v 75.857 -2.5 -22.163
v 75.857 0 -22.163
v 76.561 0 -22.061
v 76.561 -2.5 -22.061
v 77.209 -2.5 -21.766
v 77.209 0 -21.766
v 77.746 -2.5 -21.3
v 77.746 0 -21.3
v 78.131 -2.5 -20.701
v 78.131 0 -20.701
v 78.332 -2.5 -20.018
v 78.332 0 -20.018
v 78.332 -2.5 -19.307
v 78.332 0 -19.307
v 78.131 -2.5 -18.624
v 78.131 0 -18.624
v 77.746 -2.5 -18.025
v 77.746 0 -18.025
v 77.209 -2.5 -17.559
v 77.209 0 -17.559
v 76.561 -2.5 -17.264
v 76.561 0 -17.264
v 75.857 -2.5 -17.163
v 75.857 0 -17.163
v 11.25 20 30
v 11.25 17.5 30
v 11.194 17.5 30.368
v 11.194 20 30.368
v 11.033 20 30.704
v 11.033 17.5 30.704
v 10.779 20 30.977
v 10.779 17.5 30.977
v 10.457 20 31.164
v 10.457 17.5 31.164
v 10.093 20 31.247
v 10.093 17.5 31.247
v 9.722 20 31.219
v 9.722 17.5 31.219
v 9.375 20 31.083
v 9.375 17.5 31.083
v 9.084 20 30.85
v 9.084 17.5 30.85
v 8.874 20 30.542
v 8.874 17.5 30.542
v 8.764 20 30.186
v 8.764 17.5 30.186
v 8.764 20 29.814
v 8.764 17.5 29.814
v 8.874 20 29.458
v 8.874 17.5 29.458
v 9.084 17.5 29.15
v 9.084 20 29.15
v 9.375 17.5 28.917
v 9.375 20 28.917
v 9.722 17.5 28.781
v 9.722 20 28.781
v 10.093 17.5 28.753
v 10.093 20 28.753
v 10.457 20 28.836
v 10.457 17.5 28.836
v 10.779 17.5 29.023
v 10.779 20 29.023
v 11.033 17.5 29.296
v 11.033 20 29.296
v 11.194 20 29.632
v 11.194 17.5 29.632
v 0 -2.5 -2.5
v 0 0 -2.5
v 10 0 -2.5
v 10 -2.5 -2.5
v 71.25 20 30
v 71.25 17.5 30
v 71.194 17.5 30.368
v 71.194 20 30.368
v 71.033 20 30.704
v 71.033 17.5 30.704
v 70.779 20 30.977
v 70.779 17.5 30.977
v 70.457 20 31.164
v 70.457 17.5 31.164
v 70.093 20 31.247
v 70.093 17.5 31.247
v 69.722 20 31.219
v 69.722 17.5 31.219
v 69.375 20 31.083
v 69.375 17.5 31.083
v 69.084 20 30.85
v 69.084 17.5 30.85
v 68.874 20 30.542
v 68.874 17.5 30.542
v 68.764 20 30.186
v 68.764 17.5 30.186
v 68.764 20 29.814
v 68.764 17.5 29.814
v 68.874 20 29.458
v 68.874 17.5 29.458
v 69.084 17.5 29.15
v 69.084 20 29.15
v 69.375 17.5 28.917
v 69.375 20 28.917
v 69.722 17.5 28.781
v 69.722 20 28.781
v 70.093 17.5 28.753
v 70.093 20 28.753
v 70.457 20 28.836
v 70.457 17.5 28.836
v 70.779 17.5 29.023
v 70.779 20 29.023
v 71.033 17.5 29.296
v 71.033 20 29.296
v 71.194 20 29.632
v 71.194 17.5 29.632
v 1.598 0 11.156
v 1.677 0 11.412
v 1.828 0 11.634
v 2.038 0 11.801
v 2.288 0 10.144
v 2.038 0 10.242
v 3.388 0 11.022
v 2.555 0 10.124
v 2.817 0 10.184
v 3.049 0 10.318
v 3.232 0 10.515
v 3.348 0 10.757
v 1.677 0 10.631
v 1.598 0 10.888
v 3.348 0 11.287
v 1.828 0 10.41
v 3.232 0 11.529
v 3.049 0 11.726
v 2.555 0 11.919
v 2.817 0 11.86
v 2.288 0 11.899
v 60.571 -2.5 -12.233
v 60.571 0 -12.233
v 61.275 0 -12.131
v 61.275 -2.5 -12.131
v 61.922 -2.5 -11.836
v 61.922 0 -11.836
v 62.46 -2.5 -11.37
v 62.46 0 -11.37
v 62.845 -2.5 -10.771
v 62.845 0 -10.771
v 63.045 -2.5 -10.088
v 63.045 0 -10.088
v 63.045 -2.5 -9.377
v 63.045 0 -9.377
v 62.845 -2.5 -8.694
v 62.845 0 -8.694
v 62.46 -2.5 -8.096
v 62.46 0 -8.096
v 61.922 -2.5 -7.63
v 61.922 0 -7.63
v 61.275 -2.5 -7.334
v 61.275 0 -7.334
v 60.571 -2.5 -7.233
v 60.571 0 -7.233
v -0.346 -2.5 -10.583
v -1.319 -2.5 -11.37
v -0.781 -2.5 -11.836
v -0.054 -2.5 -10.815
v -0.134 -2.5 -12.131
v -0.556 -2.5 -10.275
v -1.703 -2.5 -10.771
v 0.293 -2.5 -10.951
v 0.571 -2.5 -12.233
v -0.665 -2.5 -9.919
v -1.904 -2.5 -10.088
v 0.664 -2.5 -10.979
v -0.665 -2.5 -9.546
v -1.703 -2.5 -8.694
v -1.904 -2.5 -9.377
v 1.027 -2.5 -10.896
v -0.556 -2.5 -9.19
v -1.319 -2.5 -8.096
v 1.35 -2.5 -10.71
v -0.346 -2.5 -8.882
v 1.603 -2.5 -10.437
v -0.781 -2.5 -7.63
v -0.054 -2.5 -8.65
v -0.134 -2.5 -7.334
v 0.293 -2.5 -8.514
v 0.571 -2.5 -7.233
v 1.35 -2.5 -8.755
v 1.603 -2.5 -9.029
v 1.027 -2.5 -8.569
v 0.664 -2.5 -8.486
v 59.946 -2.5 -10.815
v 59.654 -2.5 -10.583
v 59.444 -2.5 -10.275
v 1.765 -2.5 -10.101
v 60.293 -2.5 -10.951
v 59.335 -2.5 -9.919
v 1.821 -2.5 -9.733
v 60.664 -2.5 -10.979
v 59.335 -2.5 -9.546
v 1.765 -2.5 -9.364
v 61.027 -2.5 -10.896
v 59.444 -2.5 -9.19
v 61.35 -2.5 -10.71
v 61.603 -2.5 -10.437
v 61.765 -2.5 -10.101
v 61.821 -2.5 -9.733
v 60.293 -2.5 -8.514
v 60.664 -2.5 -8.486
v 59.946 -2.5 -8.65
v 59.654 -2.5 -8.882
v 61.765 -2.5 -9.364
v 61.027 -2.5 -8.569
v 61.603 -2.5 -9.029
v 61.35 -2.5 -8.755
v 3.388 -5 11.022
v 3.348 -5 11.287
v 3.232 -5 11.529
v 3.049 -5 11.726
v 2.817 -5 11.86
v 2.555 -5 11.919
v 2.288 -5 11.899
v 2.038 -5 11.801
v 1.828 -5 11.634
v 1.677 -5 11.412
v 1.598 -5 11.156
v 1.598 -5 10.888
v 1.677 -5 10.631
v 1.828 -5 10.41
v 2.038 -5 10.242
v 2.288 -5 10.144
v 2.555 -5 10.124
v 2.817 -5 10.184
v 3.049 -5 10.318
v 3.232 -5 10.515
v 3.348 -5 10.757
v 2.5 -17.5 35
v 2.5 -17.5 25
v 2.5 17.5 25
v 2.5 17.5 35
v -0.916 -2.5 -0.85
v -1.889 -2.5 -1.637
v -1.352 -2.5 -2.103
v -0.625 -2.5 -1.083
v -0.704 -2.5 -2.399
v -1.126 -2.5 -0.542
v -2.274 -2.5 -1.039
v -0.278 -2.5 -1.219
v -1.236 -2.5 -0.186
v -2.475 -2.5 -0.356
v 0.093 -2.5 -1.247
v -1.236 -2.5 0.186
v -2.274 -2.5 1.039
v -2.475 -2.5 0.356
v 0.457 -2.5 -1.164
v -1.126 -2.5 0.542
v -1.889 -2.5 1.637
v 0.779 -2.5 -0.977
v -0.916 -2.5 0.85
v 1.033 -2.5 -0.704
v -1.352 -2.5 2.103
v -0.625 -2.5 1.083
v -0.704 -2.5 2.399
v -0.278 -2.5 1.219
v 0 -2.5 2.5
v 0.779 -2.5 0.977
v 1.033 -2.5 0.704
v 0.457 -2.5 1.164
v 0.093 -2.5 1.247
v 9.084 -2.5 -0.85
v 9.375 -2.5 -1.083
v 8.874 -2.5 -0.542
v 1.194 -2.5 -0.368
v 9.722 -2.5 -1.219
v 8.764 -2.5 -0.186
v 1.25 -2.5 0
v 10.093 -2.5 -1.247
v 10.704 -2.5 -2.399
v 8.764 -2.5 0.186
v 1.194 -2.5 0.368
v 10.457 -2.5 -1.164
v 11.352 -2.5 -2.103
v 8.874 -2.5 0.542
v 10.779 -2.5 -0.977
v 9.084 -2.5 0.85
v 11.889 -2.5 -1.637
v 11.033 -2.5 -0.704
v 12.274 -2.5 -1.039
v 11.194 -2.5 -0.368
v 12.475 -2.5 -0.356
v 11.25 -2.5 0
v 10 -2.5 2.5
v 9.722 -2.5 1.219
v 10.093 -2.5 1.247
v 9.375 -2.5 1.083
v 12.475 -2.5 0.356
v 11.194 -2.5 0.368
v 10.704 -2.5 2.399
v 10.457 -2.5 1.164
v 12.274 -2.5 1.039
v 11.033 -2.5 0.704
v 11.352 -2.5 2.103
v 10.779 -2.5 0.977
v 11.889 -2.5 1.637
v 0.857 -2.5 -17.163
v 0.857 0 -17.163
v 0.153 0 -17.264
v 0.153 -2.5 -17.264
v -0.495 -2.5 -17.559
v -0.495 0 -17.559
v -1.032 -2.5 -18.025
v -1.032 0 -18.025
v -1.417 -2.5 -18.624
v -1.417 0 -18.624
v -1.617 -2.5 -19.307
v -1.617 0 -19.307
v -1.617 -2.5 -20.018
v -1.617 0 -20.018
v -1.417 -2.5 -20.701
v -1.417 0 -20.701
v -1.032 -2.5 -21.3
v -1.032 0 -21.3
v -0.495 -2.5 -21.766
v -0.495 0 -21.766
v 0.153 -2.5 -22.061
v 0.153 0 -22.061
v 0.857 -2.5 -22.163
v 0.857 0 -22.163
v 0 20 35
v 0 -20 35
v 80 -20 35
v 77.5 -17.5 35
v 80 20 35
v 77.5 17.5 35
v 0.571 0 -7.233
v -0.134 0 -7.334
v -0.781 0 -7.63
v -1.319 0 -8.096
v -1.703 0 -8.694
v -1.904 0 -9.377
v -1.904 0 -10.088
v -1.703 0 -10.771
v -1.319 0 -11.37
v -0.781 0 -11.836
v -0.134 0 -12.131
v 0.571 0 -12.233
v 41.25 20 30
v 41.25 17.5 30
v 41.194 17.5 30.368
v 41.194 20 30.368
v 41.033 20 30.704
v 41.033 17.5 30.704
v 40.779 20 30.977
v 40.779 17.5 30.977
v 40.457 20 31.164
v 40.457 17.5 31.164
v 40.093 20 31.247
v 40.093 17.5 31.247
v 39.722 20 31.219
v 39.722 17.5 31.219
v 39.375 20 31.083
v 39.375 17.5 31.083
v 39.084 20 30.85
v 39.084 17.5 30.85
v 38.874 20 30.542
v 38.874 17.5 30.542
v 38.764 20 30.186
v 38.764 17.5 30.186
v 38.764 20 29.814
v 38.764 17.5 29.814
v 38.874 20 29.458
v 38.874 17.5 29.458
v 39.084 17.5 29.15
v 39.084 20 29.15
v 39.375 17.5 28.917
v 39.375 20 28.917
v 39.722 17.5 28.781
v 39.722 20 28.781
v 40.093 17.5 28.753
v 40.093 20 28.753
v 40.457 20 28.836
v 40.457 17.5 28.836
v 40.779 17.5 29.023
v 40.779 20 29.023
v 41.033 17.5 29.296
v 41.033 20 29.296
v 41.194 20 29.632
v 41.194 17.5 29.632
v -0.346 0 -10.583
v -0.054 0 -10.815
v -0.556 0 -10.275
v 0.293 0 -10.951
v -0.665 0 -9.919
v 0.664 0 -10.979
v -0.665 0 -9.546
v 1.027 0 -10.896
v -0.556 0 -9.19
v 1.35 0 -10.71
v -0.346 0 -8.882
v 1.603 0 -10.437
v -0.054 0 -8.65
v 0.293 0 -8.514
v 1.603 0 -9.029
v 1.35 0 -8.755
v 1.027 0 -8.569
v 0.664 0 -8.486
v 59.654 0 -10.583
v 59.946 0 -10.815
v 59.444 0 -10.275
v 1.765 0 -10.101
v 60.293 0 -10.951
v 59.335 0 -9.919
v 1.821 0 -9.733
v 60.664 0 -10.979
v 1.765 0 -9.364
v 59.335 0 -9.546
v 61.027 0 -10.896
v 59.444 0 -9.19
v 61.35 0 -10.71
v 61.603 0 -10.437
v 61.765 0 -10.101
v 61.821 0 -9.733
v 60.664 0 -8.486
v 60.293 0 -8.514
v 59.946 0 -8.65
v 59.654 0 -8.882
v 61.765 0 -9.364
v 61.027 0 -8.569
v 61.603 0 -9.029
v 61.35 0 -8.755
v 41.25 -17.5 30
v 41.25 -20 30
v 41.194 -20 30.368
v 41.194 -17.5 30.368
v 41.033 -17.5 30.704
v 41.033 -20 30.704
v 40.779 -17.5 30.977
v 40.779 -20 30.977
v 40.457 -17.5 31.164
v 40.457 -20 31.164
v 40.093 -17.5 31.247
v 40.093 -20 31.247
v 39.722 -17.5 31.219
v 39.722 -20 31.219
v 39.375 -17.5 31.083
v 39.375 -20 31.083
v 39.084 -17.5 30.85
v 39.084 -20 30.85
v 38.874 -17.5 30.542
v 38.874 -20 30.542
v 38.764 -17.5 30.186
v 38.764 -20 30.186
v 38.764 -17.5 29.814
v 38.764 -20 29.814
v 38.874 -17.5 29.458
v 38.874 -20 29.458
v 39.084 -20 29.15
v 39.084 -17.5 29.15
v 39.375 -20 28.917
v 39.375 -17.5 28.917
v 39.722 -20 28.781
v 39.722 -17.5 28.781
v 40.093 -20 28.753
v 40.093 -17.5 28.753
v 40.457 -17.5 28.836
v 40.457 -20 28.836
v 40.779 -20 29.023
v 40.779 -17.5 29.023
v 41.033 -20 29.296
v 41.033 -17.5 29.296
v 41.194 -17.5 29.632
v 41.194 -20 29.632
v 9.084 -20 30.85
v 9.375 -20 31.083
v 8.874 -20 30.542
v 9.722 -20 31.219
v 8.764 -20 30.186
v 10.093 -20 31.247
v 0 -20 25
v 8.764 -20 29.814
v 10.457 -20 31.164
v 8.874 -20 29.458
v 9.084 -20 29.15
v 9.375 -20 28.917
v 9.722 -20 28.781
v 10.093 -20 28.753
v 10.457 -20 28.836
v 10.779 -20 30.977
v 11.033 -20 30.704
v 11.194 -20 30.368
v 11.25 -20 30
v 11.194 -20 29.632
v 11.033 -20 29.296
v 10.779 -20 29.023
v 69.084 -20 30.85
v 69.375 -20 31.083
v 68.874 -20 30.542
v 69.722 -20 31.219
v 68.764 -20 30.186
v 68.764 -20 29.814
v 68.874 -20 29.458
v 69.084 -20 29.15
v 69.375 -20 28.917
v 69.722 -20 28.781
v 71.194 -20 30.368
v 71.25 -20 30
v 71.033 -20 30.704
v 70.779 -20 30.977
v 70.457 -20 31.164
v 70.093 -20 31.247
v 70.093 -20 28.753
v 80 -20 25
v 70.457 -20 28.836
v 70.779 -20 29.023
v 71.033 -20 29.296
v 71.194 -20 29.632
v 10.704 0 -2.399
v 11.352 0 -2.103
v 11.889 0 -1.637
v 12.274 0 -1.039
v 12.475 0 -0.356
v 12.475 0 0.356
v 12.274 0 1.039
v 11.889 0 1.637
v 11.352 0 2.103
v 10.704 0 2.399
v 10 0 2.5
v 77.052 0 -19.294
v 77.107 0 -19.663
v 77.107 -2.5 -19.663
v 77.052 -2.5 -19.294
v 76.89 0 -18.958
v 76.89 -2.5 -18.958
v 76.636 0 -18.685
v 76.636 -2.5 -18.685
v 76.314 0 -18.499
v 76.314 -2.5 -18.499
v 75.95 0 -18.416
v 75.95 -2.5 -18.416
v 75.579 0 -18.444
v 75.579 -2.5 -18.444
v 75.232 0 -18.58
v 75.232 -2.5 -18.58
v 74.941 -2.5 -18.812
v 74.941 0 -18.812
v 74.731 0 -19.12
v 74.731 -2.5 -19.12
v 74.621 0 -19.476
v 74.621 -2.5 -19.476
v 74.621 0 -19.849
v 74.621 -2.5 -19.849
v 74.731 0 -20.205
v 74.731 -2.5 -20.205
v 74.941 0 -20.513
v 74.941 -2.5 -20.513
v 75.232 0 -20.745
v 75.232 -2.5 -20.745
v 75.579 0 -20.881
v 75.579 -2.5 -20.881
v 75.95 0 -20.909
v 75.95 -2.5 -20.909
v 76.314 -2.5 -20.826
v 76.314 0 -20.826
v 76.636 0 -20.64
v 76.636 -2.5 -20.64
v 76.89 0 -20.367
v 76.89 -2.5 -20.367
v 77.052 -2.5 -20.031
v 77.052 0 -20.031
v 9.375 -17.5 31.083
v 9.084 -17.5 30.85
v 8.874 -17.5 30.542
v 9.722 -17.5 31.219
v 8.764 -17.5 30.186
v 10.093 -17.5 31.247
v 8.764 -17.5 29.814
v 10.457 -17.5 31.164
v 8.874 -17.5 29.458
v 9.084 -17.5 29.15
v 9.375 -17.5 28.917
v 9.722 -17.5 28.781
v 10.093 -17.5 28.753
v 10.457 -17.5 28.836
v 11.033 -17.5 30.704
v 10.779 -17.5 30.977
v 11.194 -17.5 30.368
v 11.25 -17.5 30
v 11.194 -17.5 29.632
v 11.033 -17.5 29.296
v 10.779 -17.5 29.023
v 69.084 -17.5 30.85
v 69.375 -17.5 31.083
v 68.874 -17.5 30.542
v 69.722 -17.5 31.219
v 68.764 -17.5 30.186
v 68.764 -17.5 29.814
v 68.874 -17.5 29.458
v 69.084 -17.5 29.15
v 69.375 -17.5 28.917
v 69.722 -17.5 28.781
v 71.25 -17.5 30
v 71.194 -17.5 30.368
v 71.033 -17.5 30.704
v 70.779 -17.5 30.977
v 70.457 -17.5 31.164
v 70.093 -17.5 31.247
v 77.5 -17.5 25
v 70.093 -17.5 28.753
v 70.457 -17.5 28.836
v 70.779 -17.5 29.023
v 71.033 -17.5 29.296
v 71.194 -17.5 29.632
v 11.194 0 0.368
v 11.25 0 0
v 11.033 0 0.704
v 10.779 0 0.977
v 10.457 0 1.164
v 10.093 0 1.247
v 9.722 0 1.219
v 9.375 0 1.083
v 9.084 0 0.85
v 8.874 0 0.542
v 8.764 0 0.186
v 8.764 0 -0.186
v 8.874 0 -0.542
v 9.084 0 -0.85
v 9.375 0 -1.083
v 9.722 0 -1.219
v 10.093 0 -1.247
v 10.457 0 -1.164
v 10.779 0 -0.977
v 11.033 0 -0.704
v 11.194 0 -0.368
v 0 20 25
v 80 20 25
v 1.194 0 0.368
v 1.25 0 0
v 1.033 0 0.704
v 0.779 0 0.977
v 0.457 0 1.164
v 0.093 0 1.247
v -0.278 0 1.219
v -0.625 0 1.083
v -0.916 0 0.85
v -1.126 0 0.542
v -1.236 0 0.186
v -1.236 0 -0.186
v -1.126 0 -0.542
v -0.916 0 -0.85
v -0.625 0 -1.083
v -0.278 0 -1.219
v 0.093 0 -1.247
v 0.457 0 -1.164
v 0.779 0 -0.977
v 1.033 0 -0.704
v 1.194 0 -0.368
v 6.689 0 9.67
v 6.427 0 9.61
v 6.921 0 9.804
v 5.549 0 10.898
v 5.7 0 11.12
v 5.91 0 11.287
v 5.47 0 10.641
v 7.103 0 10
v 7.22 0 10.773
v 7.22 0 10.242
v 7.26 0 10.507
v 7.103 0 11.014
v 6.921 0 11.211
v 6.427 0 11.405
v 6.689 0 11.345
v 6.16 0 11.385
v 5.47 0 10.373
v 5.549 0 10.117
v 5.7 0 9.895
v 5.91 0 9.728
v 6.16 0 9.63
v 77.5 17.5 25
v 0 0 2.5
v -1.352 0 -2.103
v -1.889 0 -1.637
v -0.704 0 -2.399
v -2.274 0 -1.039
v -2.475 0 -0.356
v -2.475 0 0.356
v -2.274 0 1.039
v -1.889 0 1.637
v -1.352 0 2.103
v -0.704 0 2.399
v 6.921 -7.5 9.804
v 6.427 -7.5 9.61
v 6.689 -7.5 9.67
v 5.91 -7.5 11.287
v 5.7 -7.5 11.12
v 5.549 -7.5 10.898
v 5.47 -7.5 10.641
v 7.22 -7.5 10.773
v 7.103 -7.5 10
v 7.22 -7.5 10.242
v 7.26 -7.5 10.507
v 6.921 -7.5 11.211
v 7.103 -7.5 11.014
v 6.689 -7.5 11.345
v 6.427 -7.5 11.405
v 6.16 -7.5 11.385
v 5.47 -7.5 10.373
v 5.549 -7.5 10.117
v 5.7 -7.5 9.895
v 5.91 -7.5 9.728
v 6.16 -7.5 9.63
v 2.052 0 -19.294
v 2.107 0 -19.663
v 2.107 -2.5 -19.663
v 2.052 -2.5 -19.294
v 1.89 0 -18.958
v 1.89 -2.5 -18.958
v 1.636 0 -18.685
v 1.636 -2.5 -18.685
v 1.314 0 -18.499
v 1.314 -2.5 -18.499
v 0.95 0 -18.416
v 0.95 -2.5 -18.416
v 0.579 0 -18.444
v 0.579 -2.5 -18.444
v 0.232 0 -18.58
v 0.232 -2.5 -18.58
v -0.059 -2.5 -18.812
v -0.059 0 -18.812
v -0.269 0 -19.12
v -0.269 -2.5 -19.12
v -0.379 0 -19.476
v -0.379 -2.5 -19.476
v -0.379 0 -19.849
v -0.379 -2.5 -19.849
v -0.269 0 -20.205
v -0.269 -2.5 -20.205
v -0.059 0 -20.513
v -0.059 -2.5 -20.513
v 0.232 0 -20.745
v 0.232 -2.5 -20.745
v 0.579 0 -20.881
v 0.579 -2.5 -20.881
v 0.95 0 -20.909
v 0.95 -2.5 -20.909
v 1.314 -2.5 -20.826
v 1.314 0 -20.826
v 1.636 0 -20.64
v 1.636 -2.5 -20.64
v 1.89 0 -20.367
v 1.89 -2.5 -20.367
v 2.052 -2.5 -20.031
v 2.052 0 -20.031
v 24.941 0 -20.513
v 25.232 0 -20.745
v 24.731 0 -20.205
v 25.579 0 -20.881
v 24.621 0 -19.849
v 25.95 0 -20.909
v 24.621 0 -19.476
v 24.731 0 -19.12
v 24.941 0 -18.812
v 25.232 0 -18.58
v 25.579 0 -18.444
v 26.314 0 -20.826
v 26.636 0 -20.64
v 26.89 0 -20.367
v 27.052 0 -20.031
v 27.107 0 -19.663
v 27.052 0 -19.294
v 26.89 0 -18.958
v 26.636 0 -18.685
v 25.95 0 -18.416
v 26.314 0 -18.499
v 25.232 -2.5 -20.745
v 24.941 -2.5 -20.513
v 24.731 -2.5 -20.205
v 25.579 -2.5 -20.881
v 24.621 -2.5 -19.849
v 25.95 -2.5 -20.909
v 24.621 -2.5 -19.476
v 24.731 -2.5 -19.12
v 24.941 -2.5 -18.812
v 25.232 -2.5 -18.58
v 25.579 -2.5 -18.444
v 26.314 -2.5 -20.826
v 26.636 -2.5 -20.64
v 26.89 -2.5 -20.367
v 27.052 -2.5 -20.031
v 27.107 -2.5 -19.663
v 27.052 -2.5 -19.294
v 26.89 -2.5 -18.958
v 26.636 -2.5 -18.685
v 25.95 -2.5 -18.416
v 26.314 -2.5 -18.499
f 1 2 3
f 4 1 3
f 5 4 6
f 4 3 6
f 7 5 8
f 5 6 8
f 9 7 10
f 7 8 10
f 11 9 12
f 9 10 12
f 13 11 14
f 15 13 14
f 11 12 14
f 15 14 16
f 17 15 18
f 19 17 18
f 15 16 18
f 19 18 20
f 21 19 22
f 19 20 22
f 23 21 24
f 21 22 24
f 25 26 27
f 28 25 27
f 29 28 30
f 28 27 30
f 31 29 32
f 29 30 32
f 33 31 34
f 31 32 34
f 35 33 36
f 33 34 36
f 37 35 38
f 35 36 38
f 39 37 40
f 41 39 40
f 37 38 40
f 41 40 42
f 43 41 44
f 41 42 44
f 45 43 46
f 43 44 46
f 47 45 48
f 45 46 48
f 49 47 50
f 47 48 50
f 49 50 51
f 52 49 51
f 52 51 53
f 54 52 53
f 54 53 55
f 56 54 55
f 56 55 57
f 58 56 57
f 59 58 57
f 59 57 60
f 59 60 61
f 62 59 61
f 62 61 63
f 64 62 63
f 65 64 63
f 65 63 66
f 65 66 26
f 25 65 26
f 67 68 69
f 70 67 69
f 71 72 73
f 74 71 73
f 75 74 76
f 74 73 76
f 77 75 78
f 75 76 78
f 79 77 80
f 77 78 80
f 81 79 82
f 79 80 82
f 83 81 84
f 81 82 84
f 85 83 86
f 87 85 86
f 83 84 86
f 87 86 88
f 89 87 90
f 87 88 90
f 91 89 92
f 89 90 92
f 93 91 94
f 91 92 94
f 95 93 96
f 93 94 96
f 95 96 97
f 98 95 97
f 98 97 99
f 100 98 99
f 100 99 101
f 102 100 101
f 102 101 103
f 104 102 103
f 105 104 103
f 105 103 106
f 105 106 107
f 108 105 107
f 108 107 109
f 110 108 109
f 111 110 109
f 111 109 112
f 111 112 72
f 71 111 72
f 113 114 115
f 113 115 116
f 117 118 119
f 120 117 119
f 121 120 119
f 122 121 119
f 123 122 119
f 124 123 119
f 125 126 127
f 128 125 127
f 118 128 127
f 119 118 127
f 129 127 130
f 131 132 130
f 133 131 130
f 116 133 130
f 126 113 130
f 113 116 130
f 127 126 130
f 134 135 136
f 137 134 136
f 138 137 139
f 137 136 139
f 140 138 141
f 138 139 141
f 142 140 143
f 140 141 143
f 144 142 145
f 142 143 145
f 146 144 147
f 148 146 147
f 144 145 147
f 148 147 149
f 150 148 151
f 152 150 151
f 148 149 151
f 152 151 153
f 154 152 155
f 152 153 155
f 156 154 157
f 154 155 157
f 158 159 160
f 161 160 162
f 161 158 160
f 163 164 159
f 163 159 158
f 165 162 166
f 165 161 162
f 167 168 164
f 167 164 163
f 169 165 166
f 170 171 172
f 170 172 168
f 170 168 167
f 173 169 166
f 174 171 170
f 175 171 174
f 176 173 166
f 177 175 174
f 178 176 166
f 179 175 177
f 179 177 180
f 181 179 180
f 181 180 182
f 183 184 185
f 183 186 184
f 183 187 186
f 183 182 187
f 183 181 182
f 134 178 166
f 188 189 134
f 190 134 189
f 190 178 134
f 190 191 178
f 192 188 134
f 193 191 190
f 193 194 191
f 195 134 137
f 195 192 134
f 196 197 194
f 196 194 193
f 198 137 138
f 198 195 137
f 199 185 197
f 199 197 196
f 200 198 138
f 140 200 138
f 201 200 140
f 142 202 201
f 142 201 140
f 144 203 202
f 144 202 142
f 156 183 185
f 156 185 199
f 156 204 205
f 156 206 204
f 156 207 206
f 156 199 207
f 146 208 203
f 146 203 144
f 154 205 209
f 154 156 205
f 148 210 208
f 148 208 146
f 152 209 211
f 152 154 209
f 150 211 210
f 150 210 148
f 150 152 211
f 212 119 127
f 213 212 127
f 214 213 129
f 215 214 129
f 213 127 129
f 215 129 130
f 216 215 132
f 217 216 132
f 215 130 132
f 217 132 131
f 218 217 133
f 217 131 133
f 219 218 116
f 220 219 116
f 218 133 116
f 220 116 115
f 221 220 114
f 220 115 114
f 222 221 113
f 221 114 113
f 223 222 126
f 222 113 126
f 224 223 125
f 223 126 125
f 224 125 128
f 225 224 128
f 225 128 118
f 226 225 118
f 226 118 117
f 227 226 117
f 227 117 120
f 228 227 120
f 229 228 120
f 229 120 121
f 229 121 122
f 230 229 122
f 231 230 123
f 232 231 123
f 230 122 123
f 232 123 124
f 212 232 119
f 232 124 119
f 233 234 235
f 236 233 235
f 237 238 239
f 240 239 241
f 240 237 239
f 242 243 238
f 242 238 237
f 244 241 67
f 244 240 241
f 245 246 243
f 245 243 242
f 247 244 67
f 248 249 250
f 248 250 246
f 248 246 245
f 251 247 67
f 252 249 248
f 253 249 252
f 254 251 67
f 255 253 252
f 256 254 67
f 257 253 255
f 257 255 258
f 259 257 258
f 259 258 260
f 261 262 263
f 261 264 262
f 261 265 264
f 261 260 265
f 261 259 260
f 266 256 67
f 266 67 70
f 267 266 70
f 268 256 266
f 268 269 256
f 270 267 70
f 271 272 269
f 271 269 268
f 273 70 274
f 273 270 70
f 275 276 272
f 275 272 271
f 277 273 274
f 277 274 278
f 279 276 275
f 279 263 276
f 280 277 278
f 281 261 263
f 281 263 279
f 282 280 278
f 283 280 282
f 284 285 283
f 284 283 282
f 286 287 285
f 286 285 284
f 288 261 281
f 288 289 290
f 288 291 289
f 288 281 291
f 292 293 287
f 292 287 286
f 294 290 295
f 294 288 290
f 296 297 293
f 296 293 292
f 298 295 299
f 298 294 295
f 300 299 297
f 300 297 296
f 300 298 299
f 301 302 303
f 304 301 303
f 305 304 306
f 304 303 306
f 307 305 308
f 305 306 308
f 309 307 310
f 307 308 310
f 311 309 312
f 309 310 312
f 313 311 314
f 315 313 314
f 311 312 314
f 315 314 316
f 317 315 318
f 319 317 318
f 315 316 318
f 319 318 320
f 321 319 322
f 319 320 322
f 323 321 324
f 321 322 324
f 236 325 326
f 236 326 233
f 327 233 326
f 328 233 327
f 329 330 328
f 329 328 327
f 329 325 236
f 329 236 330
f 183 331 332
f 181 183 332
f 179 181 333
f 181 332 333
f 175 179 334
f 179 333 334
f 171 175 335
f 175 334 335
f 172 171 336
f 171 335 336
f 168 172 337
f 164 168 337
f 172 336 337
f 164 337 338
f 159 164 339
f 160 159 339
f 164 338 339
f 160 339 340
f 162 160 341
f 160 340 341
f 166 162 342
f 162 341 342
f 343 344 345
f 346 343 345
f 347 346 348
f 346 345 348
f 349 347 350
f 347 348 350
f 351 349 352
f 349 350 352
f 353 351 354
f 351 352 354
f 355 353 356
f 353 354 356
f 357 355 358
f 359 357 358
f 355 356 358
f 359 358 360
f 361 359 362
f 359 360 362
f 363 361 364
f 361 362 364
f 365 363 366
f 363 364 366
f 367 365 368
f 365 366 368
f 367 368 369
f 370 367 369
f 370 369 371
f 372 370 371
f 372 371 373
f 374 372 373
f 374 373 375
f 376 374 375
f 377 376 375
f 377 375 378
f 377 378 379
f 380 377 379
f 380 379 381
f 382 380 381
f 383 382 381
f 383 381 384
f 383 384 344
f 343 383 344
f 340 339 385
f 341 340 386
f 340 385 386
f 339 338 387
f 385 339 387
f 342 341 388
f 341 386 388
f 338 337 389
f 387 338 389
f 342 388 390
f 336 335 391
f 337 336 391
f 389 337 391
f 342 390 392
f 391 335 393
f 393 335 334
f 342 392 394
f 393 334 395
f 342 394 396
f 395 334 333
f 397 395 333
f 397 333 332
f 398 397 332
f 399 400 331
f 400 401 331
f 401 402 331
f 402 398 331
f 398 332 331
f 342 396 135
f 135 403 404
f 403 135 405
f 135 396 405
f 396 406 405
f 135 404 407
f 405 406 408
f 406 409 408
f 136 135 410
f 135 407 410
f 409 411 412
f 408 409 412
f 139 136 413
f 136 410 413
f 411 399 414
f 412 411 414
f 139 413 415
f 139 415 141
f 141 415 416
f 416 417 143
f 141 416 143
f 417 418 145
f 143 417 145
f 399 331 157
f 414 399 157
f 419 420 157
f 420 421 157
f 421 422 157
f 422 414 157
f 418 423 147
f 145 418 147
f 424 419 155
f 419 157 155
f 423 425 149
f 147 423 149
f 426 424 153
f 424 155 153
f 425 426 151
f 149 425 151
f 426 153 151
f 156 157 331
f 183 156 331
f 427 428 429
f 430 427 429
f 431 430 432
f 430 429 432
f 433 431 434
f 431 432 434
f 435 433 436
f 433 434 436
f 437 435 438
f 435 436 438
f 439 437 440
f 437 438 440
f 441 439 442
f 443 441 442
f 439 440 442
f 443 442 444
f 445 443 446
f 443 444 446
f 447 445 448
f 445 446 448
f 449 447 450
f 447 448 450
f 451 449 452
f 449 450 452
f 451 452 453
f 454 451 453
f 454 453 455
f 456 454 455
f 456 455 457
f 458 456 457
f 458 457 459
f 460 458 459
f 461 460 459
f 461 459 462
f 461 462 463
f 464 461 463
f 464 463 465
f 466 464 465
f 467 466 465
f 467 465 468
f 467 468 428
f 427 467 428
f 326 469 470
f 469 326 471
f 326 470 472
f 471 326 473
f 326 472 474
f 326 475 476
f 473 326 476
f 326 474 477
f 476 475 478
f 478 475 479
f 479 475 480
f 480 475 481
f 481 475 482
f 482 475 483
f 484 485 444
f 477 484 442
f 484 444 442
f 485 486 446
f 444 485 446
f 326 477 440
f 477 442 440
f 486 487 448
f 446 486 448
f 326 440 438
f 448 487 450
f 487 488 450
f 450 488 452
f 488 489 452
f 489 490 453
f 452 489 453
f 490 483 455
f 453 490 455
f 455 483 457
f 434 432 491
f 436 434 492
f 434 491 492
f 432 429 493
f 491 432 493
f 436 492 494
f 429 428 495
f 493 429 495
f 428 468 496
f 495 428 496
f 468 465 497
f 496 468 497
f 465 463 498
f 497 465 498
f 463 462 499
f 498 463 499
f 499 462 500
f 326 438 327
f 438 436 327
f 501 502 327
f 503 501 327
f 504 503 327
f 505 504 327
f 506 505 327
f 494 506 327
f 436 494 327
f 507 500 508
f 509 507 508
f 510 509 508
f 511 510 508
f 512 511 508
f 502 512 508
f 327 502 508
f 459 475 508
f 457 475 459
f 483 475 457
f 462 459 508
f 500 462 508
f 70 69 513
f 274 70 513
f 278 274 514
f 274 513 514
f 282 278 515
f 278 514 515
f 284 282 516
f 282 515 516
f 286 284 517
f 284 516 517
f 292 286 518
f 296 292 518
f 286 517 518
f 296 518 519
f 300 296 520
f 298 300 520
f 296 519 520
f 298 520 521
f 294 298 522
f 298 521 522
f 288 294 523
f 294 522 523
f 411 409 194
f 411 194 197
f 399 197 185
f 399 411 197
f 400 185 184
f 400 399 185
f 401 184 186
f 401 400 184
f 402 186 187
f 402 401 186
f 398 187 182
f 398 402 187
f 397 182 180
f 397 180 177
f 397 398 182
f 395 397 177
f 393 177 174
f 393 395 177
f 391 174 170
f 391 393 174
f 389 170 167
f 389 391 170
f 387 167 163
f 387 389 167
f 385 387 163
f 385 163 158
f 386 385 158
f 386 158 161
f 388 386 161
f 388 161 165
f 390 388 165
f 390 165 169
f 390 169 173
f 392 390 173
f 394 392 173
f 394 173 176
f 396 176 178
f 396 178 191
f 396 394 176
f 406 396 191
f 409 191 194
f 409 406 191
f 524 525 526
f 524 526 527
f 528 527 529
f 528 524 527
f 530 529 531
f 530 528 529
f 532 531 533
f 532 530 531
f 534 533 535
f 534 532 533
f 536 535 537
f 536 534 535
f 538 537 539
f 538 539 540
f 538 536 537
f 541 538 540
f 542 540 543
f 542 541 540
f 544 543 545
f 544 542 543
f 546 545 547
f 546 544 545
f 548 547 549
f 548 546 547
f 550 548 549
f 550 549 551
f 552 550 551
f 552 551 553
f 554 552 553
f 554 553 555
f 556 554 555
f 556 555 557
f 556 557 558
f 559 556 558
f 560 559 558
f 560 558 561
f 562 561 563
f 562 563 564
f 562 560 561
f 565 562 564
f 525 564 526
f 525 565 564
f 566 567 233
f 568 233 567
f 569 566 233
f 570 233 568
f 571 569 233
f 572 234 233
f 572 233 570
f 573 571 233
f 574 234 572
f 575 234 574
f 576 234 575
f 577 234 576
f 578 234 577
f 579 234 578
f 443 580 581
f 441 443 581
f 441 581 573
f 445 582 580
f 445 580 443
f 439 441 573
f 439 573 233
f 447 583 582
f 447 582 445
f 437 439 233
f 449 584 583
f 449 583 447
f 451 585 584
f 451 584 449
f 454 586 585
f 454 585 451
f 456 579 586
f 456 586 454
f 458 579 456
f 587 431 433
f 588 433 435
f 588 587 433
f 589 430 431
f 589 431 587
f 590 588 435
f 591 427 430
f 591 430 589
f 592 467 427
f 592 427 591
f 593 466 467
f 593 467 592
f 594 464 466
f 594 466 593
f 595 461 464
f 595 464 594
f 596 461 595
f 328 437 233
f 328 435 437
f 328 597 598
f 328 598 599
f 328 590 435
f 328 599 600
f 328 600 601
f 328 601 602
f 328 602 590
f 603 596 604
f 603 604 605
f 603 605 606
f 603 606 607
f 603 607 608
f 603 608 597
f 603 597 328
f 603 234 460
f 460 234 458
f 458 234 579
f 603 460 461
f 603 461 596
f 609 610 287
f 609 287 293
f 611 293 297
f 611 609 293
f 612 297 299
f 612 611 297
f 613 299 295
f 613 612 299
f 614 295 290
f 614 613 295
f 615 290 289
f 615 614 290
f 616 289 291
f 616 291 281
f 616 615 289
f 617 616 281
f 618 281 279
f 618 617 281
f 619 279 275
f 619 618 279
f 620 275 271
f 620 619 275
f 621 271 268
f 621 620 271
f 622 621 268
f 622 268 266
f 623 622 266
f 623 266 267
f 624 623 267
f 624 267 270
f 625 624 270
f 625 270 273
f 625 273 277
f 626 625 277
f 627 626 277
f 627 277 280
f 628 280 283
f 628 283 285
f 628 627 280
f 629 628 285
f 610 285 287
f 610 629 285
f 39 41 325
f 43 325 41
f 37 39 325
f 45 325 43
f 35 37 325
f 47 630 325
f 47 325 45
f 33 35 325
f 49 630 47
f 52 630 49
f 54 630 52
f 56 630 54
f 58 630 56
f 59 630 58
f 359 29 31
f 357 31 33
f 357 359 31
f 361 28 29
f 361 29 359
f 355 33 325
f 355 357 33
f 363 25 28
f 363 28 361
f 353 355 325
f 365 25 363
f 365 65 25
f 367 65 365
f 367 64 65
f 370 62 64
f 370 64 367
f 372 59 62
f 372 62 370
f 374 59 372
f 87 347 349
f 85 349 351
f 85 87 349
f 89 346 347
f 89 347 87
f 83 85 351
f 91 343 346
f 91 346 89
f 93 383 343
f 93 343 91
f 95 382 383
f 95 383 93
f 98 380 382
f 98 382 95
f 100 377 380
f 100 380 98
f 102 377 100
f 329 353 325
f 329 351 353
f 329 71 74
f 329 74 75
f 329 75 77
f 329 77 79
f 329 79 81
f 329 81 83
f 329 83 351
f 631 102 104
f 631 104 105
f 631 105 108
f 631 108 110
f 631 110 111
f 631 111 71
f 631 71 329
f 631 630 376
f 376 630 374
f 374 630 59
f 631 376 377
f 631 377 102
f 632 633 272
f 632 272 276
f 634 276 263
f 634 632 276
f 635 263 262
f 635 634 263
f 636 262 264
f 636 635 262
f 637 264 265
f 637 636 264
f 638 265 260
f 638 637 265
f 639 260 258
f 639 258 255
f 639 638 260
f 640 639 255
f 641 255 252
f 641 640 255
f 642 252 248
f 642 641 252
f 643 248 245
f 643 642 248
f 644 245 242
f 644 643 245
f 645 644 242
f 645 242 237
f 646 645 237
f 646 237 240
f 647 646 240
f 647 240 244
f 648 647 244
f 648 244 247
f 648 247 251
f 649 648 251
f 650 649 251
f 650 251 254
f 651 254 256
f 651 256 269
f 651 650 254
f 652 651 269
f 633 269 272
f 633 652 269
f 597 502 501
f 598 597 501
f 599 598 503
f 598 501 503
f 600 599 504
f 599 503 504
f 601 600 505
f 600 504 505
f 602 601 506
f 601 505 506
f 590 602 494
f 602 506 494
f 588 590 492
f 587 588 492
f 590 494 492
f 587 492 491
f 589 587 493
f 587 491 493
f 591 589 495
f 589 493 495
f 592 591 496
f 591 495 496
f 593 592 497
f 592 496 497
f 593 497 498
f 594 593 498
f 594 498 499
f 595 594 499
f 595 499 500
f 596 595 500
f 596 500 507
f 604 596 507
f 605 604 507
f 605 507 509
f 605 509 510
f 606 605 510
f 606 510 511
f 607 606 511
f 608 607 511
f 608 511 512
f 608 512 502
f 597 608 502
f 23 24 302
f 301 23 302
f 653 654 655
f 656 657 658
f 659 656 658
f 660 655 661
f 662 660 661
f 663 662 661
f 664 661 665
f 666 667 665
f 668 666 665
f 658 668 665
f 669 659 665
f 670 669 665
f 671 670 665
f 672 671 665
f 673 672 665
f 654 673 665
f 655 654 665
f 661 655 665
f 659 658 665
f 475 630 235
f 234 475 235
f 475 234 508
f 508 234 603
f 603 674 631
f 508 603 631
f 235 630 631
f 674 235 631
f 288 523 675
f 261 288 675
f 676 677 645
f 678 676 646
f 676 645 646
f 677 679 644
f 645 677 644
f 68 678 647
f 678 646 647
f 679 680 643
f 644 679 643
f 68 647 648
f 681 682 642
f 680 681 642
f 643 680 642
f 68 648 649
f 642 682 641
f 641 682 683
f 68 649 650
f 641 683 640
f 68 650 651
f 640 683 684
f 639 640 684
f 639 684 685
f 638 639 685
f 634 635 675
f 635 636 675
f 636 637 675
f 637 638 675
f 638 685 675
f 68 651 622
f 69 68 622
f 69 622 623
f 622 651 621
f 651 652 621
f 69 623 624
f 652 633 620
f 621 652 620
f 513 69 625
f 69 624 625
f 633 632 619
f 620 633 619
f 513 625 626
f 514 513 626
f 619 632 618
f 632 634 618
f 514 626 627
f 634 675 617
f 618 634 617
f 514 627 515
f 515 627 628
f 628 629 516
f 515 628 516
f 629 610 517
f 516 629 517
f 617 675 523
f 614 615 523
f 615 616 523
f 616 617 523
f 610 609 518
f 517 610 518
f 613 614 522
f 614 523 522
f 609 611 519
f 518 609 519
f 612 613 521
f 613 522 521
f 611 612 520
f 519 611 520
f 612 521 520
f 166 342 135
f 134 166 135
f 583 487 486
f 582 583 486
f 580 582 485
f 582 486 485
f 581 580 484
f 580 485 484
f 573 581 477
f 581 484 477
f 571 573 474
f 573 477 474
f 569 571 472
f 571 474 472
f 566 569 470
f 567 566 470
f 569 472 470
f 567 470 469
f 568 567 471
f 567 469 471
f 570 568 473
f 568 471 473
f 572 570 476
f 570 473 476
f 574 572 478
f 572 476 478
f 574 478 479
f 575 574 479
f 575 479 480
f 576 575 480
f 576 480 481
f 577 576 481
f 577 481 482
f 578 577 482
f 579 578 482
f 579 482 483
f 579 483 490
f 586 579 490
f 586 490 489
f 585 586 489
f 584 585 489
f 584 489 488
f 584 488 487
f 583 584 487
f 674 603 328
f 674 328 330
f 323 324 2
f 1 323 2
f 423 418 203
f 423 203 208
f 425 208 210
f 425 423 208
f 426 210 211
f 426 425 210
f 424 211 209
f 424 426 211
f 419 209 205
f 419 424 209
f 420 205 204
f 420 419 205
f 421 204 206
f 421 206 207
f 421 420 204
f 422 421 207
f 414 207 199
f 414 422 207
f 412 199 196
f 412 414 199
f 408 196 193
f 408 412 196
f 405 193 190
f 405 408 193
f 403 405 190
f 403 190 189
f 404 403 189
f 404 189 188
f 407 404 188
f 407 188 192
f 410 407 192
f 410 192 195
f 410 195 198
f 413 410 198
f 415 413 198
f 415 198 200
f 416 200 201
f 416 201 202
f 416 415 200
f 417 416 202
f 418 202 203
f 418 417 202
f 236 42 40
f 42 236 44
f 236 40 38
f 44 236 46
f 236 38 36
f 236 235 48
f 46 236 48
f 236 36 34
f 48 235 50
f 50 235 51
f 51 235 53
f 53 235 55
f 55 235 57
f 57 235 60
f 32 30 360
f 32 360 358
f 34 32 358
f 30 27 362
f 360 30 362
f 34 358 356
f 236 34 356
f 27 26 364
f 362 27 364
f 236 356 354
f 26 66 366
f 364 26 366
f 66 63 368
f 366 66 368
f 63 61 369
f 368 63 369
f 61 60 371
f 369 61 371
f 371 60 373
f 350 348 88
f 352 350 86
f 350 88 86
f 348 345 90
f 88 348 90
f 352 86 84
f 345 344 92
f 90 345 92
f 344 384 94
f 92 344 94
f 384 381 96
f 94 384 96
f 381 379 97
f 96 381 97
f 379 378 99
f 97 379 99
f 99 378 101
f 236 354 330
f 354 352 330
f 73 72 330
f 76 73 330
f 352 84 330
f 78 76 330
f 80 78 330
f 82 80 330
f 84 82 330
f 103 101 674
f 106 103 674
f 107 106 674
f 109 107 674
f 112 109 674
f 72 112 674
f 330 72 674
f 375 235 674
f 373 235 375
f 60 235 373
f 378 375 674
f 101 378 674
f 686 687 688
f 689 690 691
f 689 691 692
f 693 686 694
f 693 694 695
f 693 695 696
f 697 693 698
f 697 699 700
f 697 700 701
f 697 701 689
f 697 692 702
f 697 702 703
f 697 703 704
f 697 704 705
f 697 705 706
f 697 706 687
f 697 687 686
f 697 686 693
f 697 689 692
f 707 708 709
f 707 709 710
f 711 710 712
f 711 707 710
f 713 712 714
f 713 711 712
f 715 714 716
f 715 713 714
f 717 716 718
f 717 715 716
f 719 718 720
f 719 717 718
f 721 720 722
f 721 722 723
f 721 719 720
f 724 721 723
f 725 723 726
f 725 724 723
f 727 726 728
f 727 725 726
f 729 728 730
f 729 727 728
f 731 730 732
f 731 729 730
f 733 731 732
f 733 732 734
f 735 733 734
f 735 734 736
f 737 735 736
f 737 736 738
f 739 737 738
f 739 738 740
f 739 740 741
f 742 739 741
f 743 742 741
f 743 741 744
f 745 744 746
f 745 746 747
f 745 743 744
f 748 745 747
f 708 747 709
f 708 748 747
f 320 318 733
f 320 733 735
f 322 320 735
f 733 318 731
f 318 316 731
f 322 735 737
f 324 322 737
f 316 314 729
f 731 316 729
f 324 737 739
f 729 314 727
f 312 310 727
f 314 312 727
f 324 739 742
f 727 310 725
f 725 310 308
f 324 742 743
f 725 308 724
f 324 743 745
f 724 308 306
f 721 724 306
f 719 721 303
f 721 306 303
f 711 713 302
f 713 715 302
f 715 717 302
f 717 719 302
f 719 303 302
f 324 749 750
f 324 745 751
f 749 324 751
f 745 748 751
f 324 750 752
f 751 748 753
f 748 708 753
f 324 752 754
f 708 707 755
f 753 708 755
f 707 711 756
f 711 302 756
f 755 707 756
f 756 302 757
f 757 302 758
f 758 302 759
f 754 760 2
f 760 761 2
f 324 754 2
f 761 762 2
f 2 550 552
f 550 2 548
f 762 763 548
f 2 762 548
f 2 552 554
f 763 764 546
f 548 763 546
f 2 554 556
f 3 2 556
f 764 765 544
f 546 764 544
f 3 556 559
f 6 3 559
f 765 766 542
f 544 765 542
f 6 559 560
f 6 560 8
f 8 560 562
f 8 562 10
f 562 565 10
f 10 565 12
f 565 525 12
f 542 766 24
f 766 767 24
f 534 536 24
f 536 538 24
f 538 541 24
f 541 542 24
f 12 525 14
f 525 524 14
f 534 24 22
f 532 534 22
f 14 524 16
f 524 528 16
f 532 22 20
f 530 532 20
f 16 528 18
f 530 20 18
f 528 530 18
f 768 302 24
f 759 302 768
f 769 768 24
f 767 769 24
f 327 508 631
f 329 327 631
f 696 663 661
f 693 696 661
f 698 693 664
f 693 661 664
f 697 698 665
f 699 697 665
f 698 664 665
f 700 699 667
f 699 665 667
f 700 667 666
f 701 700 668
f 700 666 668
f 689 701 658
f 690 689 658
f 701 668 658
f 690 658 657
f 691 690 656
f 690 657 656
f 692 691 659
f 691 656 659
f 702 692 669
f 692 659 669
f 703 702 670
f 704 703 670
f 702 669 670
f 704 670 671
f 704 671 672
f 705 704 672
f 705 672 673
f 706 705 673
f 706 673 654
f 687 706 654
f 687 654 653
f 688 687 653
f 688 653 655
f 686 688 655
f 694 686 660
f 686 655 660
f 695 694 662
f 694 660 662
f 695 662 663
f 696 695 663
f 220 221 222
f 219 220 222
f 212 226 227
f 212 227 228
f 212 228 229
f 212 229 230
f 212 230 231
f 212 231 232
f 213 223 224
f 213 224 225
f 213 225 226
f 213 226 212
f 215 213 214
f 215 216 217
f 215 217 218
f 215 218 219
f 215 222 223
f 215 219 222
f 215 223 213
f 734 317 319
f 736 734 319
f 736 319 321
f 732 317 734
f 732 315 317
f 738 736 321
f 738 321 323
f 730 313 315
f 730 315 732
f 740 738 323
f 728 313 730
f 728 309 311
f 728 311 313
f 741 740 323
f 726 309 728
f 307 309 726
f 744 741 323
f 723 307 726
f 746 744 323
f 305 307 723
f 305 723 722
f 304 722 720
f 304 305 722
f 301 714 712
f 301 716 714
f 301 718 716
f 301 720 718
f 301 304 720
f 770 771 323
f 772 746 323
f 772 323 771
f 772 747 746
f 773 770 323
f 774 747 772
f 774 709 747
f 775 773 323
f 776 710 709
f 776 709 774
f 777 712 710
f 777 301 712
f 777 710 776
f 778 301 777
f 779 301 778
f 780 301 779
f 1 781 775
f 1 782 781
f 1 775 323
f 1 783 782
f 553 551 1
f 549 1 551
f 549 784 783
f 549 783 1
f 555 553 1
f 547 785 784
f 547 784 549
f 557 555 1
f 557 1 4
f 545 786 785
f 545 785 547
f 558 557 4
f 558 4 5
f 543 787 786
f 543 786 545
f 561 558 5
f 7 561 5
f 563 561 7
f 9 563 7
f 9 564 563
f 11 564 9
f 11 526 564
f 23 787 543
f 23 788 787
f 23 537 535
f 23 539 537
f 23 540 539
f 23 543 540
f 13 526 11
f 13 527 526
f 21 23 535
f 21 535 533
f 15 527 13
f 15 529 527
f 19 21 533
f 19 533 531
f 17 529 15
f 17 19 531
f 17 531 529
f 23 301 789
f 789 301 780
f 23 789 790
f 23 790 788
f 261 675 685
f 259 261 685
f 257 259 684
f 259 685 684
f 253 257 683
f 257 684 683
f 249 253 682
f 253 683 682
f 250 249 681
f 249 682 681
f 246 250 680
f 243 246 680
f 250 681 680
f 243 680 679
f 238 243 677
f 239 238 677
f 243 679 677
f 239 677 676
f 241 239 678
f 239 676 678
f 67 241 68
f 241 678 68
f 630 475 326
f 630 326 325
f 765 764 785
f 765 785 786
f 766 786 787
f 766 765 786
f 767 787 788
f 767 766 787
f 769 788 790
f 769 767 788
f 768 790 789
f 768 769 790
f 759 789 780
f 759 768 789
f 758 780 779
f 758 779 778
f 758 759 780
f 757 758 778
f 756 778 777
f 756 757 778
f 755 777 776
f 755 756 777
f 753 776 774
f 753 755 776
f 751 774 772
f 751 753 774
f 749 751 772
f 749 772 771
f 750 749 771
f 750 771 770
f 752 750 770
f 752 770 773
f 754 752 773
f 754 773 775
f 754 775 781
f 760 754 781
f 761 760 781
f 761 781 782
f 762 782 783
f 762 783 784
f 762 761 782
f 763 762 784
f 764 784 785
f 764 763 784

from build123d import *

# Parameters (mm, degrees)
F3_R      = 1.25
F4_DEPTH  = 2.5
F5_R      = 1.25
F6_DEPTH  = 2.5
F7_R      = 1.25
F8_DEPTH  = 2.5
F10_W     = 80
F10_H     = 40
F10_W_2   = 75
F10_H_2   = 35
F11_DEPTH = 10
F12_R     = 1.25
F13_DEPTH = 40.001
F14_R     = 0.9
F15_DEPTH = 5
F16_R     = 0.9
F17_DEPTH = 7.5


with BuildPart() as f4:
    # F3 (on Front) → F4 (new body)
    with BuildSketch(Plane.XZ):
        with BuildLine():
            Line((10, 2.5), (0, 2.5))
            ThreePointArc((0, 2.5), (-2.5, 0), (0, -2.5))
            Line((0, -2.5), (10, -2.5))
            ThreePointArc((10, -2.5), (12.5, 0), (10, 2.5))
        make_face()
        Circle(F3_R, mode=Mode.SUBTRACT)
        with Locations((10, 0)):
            Circle(F3_R, mode=Mode.SUBTRACT)
    extrude(amount=F4_DEPTH)


with BuildPart() as f6:
    # F5 (on Front) → F6 (new body)
    with BuildSketch(Plane.XZ):
        with BuildLine():
            Line((60.5706622079, -7.232673876), (0.5706622079, -7.232673876))
            ThreePointArc((0.5706622079, -7.232673876), (-1.9293377921, -9.732673876), (0.5706622079, -12.232673876))
            Line((0.5706622079, -12.232673876), (60.5706622079, -12.232673876))
            ThreePointArc((60.5706622079, -12.232673876), (63.0706622079, -9.732673876), (60.5706622079, -7.232673876))
        make_face()
        with Locations((0.5706622079, -9.732673876)):
            Circle(F5_R, mode=Mode.SUBTRACT)
        with Locations((60.5706622079, -9.732673876)):
            Circle(F5_R, mode=Mode.SUBTRACT)
    extrude(amount=F6_DEPTH)


with BuildPart() as f8:
    # F7 (on Front) → F8 (new body)
    with BuildSketch(Plane.XZ):
        with BuildLine():
            Line((75.8570737601, -17.1626018733), (0.8570737601, -17.1626018733))
            ThreePointArc((0.8570737601, -17.1626018733), (-1.6429262399, -19.6626018733), (0.8570737601, -22.1626018733))
            Line((0.8570737601, -22.1626018733), (75.8570737601, -22.1626018733))
            ThreePointArc((75.8570737601, -22.1626018733), (78.3570737601, -19.6626018733), (75.8570737601, -17.1626018733))
        make_face()
        with Locations((0.8570737601, -19.6626018733)):
            Circle(F7_R, mode=Mode.SUBTRACT)
        with Locations((25.8570737601, -19.6626018733)):
            Circle(F7_R, mode=Mode.SUBTRACT)
        with Locations((75.8570737601, -19.6626018733)):
            Circle(F7_R, mode=Mode.SUBTRACT)
    extrude(amount=F8_DEPTH)


with BuildPart() as f11:
    # F10 (on offset) → F11 (new body)
    with BuildSketch(Plane.XY.offset(25)):
        with Locations((40, 0)):
            Rectangle(F10_W, F10_H)
        with Locations((40, 0)):
            Rectangle(F10_W_2, F10_H_2, mode=Mode.SUBTRACT)
    extrude(amount=F11_DEPTH)

    # F12 (on face) → F13 (cut, through all)
    with BuildSketch(Plane.XZ.offset(20)):
        with Locations((10, 30)):
            Circle(F12_R)
        with Locations((70, 30)):
            Circle(F12_R)
        with Locations((40, 30)):
            Circle(F12_R)
    extrude(amount=-F13_DEPTH, mode=Mode.SUBTRACT)


with BuildPart() as f15:
    # F14 (on Front) → F15 (new body)
    with BuildSketch(Plane.XZ):
        with Locations((2.488047583, 11.0218990594)):
            Circle(F14_R)
    extrude(amount=F15_DEPTH)


with BuildPart() as f17:
    # F16 (on Front) → F17 (new body)
    with BuildSketch(Plane.XZ):
        with Locations((6.359864492, 10.5073517188)):
            Circle(F16_R)
    extrude(amount=F17_DEPTH)


solid = Compound([f4.part, f6.part, f8.part, f11.part, f15.part, f17.part])
